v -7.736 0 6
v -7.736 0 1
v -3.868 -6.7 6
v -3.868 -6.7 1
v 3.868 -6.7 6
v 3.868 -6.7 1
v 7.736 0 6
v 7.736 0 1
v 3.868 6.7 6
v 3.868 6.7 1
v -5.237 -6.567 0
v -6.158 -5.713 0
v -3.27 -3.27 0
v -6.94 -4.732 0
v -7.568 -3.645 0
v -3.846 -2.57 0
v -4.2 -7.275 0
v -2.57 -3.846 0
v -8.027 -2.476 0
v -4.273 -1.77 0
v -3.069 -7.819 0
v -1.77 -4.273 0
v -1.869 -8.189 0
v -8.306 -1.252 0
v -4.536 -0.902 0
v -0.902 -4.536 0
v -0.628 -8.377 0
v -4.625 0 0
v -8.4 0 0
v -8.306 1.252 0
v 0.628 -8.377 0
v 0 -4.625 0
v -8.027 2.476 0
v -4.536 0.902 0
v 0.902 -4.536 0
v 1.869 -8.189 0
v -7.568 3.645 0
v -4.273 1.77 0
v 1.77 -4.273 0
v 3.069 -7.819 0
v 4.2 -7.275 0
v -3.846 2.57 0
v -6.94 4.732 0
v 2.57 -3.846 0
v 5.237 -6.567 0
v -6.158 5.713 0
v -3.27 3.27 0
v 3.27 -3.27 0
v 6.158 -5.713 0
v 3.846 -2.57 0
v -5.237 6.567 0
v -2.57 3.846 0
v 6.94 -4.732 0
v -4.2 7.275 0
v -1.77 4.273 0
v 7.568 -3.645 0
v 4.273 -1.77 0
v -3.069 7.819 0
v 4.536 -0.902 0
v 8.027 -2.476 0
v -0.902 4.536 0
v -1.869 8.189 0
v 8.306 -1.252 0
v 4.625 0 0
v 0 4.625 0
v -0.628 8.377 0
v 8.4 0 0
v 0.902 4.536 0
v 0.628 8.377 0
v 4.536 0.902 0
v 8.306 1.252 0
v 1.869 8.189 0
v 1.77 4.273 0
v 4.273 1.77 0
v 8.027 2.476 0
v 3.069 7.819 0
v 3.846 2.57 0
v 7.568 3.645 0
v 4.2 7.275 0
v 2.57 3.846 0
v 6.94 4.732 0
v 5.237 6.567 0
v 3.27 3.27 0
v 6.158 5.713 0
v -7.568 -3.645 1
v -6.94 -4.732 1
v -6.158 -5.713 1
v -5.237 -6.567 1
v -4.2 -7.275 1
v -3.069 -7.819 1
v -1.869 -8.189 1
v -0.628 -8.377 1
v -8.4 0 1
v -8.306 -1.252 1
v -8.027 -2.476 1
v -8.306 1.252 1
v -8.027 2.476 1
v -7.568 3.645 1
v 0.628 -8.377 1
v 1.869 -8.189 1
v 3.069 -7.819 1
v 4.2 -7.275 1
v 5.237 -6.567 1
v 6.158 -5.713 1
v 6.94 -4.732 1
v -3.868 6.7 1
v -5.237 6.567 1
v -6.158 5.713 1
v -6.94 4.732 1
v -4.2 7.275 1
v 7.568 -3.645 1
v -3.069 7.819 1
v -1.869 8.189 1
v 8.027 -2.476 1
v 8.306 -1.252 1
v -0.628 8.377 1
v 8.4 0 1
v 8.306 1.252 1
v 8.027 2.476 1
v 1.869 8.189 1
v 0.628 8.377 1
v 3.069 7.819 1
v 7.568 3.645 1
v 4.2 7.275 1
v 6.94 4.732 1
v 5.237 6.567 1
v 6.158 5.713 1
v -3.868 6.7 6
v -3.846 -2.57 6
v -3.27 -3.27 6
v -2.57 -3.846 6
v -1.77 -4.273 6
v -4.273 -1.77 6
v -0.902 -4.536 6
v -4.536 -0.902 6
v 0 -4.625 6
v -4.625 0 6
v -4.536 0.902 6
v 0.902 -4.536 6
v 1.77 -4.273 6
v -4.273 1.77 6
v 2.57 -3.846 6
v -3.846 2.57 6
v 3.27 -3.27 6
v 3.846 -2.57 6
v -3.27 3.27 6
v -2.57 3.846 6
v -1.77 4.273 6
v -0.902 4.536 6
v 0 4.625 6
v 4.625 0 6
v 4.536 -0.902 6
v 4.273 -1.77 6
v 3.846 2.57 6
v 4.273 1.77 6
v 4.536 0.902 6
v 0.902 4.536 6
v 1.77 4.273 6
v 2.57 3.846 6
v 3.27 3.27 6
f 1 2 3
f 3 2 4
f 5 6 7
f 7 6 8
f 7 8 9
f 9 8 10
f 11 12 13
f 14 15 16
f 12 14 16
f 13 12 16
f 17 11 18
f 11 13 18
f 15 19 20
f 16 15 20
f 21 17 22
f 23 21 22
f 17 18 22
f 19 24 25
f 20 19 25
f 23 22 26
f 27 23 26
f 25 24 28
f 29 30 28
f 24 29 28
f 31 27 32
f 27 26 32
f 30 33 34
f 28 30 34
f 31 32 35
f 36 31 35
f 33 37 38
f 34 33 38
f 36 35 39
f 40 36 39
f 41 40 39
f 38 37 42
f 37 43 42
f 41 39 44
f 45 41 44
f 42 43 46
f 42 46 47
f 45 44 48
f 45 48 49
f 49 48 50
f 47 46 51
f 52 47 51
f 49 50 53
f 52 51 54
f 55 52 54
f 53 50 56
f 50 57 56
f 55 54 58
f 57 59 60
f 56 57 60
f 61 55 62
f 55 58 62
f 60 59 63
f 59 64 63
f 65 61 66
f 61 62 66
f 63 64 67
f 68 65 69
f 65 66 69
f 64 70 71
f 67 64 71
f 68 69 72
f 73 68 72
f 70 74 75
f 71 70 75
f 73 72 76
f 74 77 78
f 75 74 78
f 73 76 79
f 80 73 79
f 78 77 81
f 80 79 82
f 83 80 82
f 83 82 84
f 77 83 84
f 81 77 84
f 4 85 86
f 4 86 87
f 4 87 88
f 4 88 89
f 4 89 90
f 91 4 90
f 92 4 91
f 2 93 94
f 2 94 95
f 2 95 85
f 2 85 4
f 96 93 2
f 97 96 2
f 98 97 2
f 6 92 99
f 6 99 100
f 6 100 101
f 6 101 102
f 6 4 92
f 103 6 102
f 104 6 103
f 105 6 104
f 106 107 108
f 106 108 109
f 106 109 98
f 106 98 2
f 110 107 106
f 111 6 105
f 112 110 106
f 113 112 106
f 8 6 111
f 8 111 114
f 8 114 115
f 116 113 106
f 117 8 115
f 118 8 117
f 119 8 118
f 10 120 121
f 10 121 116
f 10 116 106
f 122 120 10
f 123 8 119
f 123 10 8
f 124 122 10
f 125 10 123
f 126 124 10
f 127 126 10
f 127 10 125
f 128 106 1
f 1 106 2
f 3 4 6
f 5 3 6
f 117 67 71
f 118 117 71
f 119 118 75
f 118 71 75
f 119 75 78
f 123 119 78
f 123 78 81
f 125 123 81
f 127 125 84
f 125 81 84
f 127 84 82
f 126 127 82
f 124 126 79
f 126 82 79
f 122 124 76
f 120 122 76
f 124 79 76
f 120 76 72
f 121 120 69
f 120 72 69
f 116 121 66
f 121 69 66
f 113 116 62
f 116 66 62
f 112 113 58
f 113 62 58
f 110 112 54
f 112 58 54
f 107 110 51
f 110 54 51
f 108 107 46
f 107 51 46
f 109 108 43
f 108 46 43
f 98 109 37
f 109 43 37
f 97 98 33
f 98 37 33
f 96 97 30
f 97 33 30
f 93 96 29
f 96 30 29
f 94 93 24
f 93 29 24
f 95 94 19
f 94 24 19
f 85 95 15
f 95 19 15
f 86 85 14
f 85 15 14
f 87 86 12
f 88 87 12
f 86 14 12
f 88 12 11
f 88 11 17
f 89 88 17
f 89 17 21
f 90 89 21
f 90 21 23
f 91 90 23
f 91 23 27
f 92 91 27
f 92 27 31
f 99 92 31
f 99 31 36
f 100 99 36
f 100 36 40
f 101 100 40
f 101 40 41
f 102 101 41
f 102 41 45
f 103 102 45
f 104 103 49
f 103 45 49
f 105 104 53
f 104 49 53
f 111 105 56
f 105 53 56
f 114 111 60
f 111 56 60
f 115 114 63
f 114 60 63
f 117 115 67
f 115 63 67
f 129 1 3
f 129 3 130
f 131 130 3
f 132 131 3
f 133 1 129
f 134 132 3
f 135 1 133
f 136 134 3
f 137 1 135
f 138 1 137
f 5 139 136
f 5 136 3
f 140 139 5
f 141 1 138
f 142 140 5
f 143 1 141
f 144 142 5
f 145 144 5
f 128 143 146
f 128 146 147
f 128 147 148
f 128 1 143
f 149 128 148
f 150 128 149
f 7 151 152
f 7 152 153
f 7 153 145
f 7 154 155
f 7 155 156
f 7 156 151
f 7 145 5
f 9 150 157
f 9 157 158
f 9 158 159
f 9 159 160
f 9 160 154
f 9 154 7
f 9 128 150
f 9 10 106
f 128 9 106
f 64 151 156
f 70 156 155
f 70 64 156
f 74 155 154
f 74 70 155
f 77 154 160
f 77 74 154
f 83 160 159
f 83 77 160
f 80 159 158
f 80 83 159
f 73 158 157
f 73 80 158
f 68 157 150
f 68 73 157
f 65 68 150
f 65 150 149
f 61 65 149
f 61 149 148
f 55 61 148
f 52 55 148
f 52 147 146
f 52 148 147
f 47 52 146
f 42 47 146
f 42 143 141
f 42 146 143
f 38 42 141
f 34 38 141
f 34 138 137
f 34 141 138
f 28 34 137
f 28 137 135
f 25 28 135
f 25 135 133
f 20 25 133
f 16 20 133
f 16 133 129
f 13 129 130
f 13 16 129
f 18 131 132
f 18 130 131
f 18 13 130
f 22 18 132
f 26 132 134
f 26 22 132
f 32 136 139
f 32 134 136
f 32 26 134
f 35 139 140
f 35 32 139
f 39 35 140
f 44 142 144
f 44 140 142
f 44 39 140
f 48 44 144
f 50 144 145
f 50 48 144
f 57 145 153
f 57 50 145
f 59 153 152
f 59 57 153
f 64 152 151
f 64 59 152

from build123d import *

# Parameters (mm, degrees)
PAD001_DEPTH      = 6
SKETCH004_R       = 8.4
PAD002_DEPTH      = 1
SKETCH005_R       = 4.625
POCKET_DEPTH      = 0.001
POCKET_DEPTH_BACK = 6.001


with BuildPart() as part:
    # Sketch003 → Pad001 (new body)
    with BuildSketch(Plane.XY):
        Polygon((7.736494, 0), (3.868247, 6.7), (-3.868247, 6.7), (-7.736494, 0), (-3.868247, -6.7), (3.868247, -6.7), align=None)
    extrude(amount=PAD001_DEPTH)

    # Sketch004 → Pad002 (join)
    with BuildSketch(Plane.XY):
        Circle(SKETCH004_R)
    extrude(amount=PAD002_DEPTH)

    # Sketch005 → Pocket (cut, two sides)
    with BuildSketch(Plane.XY) as pocket_sk:
        Circle(SKETCH005_R)
    extrude(amount=-POCKET_DEPTH, mode=Mode.SUBTRACT)
    extrude(pocket_sk.sketch, amount=POCKET_DEPTH_BACK, mode=Mode.SUBTRACT)


solid = part.part
